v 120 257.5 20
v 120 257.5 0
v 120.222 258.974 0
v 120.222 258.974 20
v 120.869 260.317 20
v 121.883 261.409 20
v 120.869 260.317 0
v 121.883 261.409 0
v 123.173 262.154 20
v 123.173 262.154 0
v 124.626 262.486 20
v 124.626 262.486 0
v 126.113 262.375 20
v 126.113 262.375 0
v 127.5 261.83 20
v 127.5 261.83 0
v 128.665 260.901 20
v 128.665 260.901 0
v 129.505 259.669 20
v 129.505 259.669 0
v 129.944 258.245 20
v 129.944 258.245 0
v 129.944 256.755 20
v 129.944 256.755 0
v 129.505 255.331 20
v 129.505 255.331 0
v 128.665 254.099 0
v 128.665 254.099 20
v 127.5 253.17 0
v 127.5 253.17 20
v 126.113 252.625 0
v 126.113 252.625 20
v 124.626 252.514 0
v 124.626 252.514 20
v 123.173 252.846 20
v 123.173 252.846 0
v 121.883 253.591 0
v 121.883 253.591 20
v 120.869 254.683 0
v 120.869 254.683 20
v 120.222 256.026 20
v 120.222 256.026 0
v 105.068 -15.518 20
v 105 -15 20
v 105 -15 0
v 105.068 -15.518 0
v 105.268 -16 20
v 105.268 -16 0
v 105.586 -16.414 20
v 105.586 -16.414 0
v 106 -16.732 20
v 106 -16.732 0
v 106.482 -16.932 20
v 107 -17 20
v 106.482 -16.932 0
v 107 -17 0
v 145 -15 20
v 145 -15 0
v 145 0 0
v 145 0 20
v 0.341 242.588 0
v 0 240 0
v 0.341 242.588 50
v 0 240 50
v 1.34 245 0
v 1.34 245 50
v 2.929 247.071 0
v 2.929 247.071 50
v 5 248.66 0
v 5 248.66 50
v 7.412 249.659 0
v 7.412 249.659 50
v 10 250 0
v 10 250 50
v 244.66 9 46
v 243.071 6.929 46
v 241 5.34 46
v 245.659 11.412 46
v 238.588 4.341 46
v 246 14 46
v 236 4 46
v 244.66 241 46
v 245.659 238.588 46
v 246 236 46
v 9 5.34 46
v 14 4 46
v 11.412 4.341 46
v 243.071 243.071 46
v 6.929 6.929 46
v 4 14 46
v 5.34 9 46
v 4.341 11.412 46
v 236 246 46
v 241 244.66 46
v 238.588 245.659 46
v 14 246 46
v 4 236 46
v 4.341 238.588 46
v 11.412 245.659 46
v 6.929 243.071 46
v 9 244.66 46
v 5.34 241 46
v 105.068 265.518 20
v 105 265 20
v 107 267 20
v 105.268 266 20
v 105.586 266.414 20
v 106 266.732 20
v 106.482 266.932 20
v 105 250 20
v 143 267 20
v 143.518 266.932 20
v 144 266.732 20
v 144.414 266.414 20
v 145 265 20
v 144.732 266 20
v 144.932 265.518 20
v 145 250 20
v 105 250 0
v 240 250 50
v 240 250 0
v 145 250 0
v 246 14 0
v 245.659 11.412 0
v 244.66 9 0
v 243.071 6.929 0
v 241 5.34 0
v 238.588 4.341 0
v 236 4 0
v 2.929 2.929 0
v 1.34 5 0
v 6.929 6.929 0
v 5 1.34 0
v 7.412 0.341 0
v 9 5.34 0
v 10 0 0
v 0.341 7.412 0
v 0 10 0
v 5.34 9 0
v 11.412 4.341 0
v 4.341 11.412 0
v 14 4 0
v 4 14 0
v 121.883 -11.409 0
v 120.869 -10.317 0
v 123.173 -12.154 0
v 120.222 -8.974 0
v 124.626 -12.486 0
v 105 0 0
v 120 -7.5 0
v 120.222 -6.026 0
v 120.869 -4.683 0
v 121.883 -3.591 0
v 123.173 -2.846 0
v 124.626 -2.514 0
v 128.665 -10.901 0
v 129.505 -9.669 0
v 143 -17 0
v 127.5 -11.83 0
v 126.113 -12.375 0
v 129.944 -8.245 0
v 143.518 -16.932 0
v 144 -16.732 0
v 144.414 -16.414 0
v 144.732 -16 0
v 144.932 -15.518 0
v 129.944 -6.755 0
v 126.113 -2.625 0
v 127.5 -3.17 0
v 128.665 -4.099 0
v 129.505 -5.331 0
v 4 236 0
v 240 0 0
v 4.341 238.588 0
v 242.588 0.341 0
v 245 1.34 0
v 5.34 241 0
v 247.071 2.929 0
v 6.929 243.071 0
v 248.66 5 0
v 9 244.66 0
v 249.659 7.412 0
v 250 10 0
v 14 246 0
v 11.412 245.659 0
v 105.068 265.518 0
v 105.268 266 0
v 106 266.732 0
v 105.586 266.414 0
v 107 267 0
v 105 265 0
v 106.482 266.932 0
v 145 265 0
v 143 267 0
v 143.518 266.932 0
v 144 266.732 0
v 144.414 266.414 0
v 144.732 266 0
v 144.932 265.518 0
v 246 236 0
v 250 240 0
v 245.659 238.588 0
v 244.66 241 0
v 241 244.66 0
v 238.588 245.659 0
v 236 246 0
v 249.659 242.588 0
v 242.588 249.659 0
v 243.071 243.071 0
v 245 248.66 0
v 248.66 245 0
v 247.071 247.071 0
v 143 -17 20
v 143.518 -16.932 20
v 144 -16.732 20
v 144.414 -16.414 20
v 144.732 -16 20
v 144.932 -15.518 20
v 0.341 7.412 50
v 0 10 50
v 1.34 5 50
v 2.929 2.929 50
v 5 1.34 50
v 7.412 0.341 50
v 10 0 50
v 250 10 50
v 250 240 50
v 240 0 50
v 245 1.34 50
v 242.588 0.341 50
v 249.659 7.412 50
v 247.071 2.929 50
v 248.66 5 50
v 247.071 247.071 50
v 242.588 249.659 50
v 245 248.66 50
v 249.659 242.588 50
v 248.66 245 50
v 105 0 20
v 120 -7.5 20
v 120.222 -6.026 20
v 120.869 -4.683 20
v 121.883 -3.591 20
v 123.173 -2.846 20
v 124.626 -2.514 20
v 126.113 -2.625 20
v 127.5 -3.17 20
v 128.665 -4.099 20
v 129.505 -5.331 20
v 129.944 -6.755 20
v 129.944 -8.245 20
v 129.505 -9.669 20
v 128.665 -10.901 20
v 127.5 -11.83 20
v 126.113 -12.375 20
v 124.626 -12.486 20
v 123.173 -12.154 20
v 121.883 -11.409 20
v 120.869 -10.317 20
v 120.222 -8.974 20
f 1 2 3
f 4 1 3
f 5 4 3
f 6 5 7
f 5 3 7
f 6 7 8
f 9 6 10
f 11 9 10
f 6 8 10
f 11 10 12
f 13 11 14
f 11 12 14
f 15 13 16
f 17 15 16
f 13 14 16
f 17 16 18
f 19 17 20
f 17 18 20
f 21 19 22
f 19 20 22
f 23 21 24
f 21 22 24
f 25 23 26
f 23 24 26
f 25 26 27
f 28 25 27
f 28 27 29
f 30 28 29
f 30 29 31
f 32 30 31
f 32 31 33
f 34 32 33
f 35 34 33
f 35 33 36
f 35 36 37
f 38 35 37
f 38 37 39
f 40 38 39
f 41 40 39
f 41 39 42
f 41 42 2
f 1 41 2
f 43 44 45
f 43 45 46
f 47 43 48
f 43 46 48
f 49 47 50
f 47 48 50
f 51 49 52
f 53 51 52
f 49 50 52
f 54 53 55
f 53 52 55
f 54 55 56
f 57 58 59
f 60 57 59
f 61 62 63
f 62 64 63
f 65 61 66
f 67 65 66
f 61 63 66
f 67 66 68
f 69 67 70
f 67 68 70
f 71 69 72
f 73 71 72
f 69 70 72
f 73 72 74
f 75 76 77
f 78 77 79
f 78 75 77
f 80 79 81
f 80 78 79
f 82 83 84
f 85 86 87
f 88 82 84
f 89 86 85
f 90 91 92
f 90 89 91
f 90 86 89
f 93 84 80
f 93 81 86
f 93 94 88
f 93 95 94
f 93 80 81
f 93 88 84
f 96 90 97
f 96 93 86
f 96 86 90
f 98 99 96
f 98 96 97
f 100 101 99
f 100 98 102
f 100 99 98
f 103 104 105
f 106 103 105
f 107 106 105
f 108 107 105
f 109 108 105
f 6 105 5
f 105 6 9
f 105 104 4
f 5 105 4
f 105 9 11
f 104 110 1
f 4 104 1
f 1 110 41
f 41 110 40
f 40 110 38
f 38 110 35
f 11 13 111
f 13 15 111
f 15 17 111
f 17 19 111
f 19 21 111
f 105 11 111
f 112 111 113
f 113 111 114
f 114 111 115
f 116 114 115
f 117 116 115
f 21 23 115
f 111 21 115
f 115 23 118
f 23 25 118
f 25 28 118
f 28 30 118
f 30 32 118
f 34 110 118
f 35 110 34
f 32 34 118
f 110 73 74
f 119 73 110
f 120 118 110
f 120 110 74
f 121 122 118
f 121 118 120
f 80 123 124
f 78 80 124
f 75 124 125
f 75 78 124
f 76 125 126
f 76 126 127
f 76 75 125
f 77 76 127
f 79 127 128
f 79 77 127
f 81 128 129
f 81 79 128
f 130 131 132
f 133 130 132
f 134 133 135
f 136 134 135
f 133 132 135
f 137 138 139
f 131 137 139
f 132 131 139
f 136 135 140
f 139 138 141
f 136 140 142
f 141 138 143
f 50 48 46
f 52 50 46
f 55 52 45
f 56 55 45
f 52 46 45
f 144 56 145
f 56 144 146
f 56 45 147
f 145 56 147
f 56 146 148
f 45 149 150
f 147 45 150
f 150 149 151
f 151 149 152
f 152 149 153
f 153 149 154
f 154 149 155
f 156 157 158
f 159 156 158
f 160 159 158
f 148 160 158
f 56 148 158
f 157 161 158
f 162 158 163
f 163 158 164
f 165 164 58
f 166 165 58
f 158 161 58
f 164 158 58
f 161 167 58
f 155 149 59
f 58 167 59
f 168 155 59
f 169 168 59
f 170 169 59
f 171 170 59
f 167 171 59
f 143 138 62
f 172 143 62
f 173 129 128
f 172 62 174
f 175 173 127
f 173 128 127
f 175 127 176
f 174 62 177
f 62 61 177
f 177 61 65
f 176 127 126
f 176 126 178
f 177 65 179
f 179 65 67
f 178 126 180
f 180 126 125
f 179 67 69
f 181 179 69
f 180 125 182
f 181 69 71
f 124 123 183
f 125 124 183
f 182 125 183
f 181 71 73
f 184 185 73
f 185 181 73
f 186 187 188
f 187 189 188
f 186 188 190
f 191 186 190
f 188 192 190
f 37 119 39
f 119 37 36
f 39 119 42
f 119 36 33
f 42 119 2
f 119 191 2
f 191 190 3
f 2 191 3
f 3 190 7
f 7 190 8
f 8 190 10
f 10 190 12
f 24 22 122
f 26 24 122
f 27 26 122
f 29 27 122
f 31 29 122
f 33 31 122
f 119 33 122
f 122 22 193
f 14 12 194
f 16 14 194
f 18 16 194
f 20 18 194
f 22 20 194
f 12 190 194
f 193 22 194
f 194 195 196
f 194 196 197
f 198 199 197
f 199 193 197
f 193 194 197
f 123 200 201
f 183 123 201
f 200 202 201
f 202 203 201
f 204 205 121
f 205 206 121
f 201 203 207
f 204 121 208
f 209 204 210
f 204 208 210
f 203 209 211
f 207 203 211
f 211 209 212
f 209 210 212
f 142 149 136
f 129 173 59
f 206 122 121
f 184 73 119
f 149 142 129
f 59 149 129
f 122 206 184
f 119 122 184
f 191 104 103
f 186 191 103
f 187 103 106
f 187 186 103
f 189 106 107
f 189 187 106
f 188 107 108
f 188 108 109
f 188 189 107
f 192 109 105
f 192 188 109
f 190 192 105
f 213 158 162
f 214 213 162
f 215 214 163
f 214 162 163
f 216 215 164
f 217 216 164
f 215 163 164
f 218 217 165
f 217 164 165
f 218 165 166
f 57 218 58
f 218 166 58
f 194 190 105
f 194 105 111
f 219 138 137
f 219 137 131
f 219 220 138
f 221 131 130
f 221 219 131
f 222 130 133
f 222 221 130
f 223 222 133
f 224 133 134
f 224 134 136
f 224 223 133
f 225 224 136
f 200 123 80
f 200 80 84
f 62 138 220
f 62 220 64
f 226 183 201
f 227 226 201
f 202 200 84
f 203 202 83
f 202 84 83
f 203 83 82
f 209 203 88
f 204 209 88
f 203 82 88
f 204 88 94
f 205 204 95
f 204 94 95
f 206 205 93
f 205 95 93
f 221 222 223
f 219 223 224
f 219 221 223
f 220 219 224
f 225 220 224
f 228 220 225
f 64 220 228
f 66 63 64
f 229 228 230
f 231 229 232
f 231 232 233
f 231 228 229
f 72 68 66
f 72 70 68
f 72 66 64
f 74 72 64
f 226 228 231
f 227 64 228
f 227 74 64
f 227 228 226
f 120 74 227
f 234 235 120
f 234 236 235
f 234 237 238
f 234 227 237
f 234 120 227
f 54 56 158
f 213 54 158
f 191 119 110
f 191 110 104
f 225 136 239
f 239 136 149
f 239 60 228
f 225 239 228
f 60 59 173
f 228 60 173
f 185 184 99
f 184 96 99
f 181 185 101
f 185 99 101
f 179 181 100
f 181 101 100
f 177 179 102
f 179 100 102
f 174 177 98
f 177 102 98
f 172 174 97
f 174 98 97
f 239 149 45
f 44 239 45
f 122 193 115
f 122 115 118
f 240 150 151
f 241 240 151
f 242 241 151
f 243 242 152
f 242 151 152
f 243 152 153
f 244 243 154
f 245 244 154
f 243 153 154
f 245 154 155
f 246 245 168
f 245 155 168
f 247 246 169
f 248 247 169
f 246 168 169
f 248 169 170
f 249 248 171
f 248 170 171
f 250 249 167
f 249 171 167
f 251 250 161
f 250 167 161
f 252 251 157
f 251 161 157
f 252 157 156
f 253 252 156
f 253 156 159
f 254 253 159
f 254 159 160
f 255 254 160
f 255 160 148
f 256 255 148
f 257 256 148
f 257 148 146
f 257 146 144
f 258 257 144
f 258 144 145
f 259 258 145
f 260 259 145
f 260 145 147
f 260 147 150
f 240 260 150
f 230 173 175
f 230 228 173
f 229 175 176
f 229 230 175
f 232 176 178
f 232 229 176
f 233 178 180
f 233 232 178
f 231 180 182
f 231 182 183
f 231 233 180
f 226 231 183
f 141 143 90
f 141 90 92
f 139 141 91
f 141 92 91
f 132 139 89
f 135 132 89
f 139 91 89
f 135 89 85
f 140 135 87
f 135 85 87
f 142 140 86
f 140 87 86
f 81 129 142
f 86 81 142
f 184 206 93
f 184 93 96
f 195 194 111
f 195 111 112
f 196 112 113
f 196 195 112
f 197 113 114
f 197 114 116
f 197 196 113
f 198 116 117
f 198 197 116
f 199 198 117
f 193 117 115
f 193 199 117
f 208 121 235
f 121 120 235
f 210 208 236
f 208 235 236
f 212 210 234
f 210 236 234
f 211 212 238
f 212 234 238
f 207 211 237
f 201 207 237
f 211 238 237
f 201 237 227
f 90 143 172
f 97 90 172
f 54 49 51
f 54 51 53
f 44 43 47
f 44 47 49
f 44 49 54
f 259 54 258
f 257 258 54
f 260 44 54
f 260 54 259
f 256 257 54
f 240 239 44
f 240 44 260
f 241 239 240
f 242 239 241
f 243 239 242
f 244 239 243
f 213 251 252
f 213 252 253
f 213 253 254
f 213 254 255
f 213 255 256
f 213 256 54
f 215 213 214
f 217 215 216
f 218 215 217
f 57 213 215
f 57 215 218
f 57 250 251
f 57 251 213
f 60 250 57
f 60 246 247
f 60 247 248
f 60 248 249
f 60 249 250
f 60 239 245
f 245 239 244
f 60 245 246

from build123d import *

# Parameters (mm, degrees)
SKETCH1_W           = 250
SKETCH1_H           = 250
BOSS_EXTRUDE1_DEPTH = 50
BOSS_EXTRUDE2_DEPTH = 20
SKETCH3_R           = 5
CUT_EXTRUDE1_DEPTH  = 25
SKETCH5_W           = 242
SKETCH5_H           = 242
CUT_EXTRUDE2_DEPTH  = 46
FILLET1_R           = 10
FILLET2_R           = 10


with BuildPart() as part:
    # Sketch1 → Boss-Extrude1 (new body)
    with BuildSketch(Plane.XY):
        with Locations((125, 125)):
            Rectangle(SKETCH1_W, SKETCH1_H)
    extrude(amount=BOSS_EXTRUDE1_DEPTH)

    # Sketch2 → Boss-Extrude2 (add)
    with BuildSketch(Plane.XY):
        with BuildLine():
            Line((105, 0), (105, -15))
            ThreePointArc((105, -15), (105.585786438, -16.414213562), (107, -17))
            Line((107, -17), (143, -17))
            ThreePointArc((143, -17), (144.414213562, -16.414213562), (145, -15))
            Line((145, -15), (145, 0))
            Line((145, 0), (105, 0))
        make_face()
    boss_extrude2 = extrude(amount=BOSS_EXTRUDE2_DEPTH)

    # Mirror1: Boss-Extrude2 across plane
    add(boss_extrude2.mirror(Plane.ZX.offset(125)))

    # Sketch3 → Cut-Extrude1 (cut)
    with BuildSketch(Plane(origin=(0, 0, 0), x_dir=(-1, 0, 0), z_dir=(0, 0, -1))):
        with Locations((-125, -7.5)):
            Circle(SKETCH3_R)
        with Locations((-125, 257.5)):
            Circle(SKETCH3_R)
    extrude(amount=-CUT_EXTRUDE1_DEPTH, mode=Mode.SUBTRACT)

    # Sketch5 → Cut-Extrude2 (cut)
    with BuildSketch(Plane(origin=(0, 0, 0), x_dir=(-1, 0, 0), z_dir=(0, 0, -1))):
        with Locations((-125, 125)):
            Rectangle(SKETCH5_W, SKETCH5_H)
    extrude(amount=-CUT_EXTRUDE2_DEPTH, mode=Mode.SUBTRACT)

    # Fillet1
    fillet1_edges = [part.edges().sort_by_distance(p)[0] for p in [
        (0, 250, 25),
        (250, 250, 25),
        (250, 0, 25),
        (0, 0, 25),
    ]]
    fillet(fillet1_edges, radius=FILLET1_R)

    # Fillet2
    fillet2_edges = [part.edges().sort_by_distance(p)[0] for p in [
        (246, 246, 23),
        (4, 246, 23),
        (4, 4, 23),
        (246, 4, 23),
    ]]
    fillet(fillet2_edges, radius=FILLET2_R)


solid = part.part
